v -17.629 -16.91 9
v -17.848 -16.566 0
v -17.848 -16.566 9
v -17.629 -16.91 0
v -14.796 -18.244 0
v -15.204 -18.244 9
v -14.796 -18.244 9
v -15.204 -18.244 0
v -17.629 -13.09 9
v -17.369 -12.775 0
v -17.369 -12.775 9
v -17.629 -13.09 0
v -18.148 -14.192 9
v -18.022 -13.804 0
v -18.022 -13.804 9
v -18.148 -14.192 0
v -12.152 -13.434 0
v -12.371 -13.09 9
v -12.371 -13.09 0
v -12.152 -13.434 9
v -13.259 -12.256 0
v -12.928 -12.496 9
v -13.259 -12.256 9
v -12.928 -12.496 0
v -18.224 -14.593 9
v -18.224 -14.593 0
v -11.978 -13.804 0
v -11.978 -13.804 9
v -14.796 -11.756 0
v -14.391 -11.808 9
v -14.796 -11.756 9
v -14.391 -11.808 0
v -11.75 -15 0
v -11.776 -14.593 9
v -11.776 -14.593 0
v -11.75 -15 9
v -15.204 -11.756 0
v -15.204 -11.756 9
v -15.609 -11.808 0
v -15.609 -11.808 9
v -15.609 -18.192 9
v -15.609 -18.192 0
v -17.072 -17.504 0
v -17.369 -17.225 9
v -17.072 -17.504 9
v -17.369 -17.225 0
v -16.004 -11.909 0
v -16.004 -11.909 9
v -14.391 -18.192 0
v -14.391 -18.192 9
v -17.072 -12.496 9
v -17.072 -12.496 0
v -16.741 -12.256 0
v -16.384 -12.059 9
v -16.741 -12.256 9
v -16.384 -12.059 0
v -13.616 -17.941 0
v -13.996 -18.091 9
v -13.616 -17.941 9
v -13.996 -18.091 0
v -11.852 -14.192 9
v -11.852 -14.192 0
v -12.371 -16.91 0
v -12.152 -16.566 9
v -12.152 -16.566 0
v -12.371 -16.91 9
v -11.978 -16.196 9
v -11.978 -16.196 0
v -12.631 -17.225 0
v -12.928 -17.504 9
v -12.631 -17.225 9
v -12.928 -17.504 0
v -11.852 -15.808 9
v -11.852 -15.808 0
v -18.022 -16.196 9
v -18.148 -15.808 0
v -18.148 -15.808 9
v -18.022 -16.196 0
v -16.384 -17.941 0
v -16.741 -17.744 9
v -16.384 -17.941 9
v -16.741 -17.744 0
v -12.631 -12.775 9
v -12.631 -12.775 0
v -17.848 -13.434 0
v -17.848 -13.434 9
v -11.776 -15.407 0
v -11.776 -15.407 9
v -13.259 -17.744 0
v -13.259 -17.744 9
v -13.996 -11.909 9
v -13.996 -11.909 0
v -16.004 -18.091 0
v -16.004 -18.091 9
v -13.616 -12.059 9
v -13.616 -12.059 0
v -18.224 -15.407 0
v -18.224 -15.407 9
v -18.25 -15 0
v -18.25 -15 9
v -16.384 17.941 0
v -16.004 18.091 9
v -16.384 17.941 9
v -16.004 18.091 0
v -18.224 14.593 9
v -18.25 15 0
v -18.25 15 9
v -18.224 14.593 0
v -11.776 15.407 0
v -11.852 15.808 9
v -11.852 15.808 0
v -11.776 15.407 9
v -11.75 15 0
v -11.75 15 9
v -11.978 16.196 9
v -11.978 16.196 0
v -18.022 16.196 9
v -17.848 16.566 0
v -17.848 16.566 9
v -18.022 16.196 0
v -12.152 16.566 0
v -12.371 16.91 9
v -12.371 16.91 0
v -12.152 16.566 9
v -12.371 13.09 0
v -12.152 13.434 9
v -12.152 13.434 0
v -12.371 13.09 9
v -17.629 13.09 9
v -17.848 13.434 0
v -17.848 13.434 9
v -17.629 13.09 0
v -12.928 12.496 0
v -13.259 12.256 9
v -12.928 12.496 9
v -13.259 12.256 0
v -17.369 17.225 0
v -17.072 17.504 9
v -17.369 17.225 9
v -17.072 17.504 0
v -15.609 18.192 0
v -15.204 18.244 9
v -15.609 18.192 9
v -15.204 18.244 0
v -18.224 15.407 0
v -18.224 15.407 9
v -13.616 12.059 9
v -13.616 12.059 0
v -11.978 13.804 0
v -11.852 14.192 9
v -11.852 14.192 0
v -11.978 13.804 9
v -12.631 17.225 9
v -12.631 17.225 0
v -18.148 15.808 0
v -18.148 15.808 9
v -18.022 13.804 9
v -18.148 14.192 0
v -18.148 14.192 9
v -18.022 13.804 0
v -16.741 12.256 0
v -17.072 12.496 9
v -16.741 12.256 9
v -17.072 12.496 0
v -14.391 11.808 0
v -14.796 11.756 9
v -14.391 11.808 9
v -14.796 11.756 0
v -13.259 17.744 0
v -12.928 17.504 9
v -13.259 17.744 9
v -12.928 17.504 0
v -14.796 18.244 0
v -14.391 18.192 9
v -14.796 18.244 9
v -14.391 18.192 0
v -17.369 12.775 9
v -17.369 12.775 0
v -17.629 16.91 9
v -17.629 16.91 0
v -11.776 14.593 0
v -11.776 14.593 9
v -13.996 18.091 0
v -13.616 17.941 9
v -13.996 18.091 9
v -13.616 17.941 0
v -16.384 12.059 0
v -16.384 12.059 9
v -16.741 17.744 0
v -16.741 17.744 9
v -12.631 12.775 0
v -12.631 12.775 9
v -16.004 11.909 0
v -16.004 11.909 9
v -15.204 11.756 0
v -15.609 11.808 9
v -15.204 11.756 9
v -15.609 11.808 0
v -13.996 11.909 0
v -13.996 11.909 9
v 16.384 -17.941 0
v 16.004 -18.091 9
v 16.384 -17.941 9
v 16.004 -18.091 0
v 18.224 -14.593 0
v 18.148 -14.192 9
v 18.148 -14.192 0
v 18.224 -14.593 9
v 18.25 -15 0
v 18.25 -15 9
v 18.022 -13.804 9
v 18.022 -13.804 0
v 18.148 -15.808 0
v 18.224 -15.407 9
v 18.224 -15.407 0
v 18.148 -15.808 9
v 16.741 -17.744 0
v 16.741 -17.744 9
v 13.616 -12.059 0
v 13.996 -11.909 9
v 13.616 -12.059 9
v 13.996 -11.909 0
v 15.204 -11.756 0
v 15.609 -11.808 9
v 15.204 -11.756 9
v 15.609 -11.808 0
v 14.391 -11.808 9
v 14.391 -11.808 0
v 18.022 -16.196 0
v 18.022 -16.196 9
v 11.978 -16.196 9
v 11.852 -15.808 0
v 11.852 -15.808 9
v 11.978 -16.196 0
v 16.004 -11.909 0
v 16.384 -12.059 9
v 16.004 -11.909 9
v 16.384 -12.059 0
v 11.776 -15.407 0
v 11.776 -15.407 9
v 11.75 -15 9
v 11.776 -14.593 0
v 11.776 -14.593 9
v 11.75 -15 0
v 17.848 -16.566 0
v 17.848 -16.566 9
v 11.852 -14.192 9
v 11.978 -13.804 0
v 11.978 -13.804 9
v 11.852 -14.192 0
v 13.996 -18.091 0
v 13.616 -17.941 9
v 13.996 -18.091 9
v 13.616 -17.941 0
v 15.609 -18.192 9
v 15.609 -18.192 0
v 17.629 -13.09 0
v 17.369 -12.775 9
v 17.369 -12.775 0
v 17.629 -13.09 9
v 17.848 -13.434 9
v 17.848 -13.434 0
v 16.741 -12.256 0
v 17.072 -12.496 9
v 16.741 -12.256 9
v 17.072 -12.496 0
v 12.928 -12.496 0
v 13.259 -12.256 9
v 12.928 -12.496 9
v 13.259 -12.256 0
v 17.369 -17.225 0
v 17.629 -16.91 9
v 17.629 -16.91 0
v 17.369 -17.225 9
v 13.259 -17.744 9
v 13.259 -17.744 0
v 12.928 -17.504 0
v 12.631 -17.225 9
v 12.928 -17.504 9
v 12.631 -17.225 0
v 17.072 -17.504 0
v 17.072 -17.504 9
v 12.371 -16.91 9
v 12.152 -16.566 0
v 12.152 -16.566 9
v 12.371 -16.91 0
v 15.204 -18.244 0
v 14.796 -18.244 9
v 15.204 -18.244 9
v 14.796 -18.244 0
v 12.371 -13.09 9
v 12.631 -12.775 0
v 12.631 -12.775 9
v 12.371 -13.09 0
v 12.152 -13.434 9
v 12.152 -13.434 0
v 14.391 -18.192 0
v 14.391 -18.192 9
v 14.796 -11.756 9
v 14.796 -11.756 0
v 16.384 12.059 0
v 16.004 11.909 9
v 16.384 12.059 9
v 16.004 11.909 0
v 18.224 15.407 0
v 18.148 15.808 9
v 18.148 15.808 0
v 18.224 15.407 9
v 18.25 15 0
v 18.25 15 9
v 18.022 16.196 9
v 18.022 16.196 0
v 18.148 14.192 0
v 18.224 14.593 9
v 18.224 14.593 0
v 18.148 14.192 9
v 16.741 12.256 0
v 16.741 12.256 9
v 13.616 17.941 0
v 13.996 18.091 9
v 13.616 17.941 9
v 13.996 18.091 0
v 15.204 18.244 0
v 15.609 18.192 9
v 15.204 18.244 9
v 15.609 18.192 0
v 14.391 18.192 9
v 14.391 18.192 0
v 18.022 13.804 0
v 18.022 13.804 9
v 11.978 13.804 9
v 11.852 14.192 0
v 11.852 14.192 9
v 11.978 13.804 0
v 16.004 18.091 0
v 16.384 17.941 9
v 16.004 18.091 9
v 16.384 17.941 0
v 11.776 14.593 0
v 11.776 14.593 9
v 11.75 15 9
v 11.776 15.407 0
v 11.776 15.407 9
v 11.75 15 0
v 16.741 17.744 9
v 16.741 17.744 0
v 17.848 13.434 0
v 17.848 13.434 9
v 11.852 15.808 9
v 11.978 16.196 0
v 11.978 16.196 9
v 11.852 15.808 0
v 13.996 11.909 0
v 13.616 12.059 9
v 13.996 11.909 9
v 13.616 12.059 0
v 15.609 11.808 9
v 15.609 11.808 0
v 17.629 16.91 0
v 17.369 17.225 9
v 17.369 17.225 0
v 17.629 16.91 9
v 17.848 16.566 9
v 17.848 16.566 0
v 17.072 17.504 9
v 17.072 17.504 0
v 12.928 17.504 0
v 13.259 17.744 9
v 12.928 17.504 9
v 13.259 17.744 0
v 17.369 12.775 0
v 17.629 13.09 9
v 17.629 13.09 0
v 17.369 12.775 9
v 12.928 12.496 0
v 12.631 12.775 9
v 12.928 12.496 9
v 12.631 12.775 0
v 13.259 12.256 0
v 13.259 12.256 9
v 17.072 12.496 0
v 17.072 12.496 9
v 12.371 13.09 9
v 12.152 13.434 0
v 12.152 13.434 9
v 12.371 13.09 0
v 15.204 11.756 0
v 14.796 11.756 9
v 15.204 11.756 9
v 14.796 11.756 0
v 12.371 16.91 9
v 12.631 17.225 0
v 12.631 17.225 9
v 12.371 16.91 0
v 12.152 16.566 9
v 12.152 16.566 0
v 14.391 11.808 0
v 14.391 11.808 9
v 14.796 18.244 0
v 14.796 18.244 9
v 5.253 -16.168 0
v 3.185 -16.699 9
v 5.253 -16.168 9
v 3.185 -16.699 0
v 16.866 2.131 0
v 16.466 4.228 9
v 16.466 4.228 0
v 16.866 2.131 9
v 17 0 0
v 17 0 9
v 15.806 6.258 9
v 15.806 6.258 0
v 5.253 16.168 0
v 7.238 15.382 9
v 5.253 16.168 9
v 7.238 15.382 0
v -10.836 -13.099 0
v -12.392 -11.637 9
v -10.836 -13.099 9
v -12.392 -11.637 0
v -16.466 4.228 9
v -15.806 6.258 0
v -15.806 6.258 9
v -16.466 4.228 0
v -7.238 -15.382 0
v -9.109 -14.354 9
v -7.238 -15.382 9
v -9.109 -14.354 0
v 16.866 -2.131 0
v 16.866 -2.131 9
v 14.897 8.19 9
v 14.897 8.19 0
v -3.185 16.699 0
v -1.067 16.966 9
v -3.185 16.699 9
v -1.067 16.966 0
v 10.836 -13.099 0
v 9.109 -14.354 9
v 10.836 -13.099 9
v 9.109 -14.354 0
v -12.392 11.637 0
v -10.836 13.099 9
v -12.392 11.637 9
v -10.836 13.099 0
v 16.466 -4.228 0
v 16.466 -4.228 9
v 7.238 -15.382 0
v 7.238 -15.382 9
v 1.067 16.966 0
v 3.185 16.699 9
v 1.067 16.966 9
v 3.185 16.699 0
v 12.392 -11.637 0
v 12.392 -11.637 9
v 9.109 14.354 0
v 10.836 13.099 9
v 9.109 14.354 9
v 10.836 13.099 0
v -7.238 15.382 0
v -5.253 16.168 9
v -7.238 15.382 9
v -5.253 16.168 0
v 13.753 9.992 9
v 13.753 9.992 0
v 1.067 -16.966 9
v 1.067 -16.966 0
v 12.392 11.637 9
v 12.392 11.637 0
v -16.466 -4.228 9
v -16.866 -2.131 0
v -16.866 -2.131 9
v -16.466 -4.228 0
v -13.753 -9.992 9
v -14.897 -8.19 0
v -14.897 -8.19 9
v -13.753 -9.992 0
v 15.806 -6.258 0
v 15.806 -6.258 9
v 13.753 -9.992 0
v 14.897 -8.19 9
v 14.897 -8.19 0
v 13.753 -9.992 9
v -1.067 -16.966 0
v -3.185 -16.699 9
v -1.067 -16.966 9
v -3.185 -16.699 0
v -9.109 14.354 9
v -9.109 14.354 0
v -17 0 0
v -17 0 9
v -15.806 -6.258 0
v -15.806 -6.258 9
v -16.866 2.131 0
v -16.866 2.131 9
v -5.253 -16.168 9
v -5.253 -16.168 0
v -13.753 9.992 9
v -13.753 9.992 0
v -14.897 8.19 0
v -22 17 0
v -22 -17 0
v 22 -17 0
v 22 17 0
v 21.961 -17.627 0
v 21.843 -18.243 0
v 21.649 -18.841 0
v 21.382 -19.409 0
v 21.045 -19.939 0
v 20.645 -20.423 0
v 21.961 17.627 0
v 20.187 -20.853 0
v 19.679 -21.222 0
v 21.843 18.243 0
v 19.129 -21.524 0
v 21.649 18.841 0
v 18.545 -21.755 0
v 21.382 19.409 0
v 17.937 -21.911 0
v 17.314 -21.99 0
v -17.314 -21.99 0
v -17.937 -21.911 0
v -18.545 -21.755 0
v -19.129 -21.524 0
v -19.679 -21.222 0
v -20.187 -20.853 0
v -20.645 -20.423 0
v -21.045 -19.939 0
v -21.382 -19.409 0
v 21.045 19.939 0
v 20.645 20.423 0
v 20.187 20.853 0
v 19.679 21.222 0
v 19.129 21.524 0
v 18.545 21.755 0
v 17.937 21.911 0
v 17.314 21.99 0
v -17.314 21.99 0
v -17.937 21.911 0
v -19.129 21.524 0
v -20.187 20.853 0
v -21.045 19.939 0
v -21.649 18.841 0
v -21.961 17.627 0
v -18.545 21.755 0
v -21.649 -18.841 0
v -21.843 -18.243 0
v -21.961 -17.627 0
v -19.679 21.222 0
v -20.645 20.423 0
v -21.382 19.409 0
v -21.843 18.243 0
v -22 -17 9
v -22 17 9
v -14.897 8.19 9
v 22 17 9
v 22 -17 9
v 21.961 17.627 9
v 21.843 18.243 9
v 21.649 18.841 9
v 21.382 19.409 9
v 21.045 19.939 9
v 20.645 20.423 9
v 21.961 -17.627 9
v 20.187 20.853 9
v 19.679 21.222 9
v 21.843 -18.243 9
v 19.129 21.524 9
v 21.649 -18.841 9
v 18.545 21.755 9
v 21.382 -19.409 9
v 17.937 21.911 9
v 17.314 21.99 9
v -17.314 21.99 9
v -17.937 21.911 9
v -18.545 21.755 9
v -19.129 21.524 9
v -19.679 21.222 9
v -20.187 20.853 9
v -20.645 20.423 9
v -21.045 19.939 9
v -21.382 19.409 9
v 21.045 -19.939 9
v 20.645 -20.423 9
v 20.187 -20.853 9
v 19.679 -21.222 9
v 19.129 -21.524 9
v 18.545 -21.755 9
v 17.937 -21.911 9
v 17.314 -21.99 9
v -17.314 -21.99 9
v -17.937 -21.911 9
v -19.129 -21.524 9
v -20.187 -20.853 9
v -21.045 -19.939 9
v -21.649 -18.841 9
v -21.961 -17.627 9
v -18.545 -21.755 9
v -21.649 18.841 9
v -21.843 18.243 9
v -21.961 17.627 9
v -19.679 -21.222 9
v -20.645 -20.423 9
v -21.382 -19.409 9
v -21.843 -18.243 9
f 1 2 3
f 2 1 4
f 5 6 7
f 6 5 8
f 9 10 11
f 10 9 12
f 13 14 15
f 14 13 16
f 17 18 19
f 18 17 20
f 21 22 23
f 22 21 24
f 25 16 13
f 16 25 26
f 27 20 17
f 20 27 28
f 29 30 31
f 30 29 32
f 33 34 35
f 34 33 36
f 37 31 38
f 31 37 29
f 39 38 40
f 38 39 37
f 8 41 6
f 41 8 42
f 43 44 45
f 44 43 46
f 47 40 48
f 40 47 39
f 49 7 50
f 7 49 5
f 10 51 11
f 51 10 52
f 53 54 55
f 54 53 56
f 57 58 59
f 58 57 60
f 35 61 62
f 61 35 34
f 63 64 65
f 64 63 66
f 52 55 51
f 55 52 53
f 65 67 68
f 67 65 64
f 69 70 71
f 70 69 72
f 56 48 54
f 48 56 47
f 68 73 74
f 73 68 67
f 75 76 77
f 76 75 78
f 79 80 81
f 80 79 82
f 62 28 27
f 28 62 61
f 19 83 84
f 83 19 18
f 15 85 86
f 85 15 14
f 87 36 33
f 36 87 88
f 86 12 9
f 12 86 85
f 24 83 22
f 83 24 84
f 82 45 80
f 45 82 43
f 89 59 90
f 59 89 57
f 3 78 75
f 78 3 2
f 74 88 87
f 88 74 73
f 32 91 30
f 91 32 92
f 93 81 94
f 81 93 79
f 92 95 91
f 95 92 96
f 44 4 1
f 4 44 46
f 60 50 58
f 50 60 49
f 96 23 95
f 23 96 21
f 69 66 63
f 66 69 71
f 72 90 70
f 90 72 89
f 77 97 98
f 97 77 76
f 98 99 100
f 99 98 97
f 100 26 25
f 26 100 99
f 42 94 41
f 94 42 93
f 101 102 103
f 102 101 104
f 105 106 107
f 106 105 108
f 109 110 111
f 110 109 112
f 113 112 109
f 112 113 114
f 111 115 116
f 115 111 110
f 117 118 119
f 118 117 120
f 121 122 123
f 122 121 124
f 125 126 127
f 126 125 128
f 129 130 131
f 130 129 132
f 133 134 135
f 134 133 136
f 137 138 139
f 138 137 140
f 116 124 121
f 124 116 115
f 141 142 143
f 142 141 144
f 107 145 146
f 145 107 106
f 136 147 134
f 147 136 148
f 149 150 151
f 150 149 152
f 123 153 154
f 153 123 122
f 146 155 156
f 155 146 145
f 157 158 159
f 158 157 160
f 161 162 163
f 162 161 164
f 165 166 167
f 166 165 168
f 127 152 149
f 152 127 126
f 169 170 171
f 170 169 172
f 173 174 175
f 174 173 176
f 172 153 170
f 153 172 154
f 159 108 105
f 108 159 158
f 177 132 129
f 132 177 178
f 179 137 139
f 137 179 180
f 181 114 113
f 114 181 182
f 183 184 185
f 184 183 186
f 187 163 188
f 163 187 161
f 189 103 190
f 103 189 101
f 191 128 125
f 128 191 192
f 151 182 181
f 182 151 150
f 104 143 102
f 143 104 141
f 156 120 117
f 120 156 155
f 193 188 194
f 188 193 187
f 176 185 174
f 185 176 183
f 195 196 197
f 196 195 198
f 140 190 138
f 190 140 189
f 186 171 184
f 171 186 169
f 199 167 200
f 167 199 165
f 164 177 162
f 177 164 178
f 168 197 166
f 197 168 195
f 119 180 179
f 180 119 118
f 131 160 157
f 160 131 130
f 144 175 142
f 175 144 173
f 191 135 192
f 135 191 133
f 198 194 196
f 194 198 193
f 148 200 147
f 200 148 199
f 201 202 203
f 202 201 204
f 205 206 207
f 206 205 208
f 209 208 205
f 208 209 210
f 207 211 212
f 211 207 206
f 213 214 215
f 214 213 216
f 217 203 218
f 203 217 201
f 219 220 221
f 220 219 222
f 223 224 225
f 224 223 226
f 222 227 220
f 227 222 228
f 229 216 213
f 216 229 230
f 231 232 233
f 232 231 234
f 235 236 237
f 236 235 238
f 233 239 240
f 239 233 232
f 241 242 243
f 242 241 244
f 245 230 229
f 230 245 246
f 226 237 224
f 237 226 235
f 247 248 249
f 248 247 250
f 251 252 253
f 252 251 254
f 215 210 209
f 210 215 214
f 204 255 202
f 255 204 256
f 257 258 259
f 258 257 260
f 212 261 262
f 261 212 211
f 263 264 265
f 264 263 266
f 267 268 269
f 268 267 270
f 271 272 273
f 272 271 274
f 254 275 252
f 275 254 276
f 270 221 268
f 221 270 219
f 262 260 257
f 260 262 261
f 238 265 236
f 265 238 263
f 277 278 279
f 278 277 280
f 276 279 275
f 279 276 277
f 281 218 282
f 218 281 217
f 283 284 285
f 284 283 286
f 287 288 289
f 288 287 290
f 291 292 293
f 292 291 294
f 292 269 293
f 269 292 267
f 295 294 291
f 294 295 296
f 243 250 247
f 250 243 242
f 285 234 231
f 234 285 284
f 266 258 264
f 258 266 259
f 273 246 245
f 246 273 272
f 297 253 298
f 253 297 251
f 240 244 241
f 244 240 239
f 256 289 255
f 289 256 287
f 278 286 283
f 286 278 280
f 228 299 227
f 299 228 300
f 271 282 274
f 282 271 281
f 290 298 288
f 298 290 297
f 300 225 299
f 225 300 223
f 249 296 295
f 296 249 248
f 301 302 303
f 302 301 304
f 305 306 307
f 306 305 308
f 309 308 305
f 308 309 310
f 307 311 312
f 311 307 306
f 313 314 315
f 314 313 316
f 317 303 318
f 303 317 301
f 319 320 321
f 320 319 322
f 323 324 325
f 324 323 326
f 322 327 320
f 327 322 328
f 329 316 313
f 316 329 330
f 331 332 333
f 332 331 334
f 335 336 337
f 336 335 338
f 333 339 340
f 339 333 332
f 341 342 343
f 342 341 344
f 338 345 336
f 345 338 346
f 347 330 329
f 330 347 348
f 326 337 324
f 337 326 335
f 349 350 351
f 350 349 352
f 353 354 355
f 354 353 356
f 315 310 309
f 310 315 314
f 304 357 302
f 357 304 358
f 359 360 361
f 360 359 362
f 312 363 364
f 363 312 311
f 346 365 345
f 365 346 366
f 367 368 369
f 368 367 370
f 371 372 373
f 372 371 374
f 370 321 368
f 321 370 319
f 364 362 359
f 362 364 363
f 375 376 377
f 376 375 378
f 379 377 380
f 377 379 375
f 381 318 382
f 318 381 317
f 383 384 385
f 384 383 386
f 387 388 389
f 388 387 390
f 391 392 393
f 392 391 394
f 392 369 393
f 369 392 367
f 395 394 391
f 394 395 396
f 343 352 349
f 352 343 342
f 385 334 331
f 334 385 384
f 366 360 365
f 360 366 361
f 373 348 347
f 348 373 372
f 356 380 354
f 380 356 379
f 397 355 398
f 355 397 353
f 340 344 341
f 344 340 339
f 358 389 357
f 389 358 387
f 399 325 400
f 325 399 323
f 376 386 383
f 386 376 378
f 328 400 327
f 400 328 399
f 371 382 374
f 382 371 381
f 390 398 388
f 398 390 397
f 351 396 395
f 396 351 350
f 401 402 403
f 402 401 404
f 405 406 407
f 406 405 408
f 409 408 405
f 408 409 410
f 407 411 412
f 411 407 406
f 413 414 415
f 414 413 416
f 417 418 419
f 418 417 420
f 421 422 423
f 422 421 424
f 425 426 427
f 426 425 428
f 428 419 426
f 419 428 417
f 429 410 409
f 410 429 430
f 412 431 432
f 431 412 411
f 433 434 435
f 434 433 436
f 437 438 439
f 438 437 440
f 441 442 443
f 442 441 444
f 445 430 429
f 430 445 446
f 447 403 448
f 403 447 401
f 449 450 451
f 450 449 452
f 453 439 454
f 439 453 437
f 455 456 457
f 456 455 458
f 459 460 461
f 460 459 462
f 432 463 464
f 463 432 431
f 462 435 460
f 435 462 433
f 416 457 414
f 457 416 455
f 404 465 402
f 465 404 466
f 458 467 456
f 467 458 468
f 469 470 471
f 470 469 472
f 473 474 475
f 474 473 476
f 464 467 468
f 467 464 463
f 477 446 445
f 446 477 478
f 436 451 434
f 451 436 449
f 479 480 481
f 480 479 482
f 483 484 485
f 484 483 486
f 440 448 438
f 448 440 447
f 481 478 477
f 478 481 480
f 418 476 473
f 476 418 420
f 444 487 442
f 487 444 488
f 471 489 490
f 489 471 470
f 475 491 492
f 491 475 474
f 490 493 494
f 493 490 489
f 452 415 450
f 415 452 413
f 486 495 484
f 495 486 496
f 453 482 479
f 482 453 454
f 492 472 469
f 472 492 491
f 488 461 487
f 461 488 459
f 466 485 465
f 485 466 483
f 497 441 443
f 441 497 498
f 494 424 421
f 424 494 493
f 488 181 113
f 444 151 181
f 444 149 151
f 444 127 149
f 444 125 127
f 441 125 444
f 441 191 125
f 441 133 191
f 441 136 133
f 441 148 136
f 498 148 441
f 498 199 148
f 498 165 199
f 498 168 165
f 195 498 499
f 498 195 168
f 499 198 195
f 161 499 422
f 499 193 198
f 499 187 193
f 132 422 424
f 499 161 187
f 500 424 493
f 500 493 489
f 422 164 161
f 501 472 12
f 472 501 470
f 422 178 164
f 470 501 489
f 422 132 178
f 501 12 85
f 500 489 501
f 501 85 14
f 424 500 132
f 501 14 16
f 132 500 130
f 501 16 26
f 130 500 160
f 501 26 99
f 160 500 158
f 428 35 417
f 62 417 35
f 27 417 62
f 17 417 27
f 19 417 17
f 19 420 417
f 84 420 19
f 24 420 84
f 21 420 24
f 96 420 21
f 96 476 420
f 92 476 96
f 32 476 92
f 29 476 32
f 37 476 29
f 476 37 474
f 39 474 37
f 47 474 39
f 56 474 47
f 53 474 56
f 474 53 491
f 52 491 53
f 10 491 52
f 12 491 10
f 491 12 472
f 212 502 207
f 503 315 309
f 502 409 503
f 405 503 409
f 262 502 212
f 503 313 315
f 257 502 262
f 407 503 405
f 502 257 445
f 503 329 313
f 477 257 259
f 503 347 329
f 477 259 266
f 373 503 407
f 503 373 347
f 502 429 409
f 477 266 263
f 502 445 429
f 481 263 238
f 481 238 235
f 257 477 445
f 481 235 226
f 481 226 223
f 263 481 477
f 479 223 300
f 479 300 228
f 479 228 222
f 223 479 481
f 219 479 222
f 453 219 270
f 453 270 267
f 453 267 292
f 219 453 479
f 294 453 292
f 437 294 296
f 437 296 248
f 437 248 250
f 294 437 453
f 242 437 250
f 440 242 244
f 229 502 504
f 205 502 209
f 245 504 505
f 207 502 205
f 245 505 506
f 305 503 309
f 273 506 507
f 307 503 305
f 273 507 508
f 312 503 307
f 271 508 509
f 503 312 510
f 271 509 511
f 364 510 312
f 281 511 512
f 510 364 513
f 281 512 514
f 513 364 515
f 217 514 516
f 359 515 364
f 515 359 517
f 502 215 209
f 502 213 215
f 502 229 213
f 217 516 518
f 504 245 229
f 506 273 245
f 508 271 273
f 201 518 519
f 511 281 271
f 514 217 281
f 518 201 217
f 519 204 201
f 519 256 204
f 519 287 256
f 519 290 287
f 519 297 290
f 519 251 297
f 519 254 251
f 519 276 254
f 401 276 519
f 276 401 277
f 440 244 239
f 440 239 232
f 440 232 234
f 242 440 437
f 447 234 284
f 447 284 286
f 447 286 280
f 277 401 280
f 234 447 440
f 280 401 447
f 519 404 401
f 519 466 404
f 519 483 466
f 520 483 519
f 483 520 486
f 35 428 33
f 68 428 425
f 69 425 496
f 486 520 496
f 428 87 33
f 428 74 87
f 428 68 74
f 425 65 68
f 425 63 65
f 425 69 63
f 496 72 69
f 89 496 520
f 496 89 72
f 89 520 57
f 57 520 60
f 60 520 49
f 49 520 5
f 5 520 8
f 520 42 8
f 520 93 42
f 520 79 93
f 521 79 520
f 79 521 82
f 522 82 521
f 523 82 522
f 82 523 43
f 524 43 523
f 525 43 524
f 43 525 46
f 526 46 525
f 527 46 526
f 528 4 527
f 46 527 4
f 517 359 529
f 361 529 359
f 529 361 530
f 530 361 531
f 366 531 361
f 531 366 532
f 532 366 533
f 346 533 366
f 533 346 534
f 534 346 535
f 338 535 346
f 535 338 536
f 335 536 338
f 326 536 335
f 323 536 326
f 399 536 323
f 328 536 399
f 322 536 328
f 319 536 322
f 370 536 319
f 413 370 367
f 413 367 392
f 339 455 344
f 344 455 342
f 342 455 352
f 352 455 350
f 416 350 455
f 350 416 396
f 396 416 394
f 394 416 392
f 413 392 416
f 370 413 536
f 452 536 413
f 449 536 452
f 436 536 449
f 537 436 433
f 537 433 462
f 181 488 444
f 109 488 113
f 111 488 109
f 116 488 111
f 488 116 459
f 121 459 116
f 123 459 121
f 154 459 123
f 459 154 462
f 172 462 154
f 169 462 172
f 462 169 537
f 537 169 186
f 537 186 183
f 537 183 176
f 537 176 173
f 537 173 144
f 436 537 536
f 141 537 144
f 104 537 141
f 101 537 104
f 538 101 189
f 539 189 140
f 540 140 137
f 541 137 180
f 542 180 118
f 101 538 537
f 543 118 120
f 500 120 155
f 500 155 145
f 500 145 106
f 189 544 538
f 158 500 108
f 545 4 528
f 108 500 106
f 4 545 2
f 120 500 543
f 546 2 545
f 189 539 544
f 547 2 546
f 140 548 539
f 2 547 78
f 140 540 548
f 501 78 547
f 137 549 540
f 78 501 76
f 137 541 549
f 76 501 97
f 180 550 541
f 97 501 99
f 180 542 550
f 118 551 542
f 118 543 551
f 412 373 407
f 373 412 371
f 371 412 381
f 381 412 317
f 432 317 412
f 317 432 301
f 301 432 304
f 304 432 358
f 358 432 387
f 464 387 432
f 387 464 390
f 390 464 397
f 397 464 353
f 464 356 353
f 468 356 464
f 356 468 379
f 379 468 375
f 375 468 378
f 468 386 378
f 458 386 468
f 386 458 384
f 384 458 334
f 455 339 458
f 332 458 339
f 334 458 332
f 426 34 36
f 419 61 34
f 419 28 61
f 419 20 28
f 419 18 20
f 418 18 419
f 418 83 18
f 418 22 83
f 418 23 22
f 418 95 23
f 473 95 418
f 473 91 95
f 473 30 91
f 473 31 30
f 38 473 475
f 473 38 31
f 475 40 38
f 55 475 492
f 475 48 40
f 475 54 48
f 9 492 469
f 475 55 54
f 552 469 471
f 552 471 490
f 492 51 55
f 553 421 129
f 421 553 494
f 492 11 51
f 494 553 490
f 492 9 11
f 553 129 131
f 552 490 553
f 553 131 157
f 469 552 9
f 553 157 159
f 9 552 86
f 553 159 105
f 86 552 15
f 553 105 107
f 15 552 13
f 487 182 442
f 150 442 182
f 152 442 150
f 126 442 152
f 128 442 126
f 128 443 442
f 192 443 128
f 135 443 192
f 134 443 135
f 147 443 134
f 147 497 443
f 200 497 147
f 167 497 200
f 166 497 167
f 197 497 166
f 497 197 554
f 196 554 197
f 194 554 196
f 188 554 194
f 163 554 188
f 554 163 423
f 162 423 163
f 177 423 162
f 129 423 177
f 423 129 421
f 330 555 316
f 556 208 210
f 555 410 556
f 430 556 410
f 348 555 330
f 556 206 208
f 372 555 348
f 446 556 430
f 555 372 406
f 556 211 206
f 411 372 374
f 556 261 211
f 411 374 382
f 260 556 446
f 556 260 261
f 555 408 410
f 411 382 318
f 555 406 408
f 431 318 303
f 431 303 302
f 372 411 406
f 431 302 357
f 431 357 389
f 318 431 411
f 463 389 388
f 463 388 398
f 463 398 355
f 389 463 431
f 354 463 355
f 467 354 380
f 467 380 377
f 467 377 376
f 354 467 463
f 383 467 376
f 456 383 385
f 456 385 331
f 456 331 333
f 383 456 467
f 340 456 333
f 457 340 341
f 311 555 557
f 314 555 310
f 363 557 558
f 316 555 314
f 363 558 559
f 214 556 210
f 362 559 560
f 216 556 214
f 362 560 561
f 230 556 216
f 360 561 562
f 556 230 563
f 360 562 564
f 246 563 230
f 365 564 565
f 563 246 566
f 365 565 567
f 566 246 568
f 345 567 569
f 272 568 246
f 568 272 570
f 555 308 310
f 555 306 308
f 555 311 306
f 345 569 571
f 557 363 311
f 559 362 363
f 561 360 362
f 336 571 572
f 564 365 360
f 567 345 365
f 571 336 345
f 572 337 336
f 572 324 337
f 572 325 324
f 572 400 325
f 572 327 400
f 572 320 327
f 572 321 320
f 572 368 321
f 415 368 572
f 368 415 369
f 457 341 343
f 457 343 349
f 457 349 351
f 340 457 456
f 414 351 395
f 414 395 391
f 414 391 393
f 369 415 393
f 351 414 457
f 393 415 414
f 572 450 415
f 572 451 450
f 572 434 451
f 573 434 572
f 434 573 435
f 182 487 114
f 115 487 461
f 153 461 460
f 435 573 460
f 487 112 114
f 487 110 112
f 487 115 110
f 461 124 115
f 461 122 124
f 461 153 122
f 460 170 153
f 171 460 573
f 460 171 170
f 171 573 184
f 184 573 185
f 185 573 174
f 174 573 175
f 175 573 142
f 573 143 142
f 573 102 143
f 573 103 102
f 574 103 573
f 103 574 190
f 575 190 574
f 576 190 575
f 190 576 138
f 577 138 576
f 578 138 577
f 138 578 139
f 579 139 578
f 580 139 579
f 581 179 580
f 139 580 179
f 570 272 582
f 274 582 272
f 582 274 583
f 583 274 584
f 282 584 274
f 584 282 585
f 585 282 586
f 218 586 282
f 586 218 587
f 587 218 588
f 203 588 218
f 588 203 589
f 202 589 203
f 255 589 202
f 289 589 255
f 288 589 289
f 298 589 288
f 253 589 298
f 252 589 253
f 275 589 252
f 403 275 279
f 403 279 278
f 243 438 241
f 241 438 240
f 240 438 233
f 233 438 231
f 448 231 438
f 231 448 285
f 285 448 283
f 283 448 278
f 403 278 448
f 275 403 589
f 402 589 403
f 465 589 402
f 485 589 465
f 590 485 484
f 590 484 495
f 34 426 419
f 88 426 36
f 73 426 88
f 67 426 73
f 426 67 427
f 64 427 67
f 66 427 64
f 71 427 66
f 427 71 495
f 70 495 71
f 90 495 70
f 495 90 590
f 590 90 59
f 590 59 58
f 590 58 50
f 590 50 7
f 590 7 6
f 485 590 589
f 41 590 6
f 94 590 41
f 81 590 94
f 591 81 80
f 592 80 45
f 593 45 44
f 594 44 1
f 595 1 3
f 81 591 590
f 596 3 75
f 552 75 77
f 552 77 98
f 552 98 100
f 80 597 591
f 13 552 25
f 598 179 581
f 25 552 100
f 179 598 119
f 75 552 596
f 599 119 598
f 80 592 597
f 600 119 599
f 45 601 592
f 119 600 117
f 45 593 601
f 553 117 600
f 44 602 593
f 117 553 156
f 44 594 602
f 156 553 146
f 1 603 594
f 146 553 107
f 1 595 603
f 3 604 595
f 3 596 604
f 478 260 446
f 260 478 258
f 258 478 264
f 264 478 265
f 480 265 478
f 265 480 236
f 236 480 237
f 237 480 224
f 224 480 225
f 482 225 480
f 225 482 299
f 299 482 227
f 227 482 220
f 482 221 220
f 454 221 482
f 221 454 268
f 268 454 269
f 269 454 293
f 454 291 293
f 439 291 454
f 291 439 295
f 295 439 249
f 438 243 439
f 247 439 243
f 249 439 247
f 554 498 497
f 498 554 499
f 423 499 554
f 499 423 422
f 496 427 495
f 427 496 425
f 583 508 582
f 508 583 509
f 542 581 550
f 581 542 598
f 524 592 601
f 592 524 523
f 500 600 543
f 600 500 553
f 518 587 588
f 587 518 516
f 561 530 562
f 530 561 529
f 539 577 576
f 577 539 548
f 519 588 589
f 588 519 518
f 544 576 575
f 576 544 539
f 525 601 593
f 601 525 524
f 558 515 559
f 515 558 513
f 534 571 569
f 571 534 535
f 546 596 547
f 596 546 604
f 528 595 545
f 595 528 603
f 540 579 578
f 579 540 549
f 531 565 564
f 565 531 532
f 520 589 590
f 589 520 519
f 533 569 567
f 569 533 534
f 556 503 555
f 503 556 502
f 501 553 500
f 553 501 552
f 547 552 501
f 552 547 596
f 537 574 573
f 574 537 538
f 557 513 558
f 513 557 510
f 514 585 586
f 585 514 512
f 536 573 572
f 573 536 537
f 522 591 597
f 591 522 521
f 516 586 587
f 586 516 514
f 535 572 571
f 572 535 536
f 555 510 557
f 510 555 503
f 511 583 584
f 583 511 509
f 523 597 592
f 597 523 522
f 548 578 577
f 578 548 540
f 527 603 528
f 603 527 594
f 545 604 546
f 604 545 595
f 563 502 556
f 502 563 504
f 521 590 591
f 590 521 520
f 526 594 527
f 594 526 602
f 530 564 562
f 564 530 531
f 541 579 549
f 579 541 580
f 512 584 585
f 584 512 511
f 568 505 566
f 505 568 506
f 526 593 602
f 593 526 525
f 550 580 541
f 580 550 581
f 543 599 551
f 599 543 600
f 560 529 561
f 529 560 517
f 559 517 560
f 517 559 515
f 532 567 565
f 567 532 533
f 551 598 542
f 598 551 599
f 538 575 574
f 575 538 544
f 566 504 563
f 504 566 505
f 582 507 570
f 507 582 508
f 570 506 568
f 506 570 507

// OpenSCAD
$fn = 50;


difference() {
	union() {
		hull() {
			translate(v = [-17.0000000000, 17.0000000000, 0]) {
				cylinder(h = 9, r = 5);
			}
			translate(v = [17.0000000000, 17.0000000000, 0]) {
				cylinder(h = 9, r = 5);
			}
			translate(v = [-17.0000000000, -17.0000000000, 0]) {
				cylinder(h = 9, r = 5);
			}
			translate(v = [17.0000000000, -17.0000000000, 0]) {
				cylinder(h = 9, r = 5);
			}
		}
	}
	union() {
		#translate(v = [-15.0000000000, -15.0000000000, -100.0000000000]) {
			cylinder(h = 200, r = 3.2500000000);
		}
		#translate(v = [-15.0000000000, 15.0000000000, -100.0000000000]) {
			cylinder(h = 200, r = 3.2500000000);
		}
		#translate(v = [15.0000000000, -15.0000000000, -100.0000000000]) {
			cylinder(h = 200, r = 3.2500000000);
		}
		#translate(v = [15.0000000000, 15.0000000000, -100.0000000000]) {
			cylinder(h = 200, r = 3.2500000000);
		}
		#cylinder(h = 9, r = 17.0000000000);
	}
}
